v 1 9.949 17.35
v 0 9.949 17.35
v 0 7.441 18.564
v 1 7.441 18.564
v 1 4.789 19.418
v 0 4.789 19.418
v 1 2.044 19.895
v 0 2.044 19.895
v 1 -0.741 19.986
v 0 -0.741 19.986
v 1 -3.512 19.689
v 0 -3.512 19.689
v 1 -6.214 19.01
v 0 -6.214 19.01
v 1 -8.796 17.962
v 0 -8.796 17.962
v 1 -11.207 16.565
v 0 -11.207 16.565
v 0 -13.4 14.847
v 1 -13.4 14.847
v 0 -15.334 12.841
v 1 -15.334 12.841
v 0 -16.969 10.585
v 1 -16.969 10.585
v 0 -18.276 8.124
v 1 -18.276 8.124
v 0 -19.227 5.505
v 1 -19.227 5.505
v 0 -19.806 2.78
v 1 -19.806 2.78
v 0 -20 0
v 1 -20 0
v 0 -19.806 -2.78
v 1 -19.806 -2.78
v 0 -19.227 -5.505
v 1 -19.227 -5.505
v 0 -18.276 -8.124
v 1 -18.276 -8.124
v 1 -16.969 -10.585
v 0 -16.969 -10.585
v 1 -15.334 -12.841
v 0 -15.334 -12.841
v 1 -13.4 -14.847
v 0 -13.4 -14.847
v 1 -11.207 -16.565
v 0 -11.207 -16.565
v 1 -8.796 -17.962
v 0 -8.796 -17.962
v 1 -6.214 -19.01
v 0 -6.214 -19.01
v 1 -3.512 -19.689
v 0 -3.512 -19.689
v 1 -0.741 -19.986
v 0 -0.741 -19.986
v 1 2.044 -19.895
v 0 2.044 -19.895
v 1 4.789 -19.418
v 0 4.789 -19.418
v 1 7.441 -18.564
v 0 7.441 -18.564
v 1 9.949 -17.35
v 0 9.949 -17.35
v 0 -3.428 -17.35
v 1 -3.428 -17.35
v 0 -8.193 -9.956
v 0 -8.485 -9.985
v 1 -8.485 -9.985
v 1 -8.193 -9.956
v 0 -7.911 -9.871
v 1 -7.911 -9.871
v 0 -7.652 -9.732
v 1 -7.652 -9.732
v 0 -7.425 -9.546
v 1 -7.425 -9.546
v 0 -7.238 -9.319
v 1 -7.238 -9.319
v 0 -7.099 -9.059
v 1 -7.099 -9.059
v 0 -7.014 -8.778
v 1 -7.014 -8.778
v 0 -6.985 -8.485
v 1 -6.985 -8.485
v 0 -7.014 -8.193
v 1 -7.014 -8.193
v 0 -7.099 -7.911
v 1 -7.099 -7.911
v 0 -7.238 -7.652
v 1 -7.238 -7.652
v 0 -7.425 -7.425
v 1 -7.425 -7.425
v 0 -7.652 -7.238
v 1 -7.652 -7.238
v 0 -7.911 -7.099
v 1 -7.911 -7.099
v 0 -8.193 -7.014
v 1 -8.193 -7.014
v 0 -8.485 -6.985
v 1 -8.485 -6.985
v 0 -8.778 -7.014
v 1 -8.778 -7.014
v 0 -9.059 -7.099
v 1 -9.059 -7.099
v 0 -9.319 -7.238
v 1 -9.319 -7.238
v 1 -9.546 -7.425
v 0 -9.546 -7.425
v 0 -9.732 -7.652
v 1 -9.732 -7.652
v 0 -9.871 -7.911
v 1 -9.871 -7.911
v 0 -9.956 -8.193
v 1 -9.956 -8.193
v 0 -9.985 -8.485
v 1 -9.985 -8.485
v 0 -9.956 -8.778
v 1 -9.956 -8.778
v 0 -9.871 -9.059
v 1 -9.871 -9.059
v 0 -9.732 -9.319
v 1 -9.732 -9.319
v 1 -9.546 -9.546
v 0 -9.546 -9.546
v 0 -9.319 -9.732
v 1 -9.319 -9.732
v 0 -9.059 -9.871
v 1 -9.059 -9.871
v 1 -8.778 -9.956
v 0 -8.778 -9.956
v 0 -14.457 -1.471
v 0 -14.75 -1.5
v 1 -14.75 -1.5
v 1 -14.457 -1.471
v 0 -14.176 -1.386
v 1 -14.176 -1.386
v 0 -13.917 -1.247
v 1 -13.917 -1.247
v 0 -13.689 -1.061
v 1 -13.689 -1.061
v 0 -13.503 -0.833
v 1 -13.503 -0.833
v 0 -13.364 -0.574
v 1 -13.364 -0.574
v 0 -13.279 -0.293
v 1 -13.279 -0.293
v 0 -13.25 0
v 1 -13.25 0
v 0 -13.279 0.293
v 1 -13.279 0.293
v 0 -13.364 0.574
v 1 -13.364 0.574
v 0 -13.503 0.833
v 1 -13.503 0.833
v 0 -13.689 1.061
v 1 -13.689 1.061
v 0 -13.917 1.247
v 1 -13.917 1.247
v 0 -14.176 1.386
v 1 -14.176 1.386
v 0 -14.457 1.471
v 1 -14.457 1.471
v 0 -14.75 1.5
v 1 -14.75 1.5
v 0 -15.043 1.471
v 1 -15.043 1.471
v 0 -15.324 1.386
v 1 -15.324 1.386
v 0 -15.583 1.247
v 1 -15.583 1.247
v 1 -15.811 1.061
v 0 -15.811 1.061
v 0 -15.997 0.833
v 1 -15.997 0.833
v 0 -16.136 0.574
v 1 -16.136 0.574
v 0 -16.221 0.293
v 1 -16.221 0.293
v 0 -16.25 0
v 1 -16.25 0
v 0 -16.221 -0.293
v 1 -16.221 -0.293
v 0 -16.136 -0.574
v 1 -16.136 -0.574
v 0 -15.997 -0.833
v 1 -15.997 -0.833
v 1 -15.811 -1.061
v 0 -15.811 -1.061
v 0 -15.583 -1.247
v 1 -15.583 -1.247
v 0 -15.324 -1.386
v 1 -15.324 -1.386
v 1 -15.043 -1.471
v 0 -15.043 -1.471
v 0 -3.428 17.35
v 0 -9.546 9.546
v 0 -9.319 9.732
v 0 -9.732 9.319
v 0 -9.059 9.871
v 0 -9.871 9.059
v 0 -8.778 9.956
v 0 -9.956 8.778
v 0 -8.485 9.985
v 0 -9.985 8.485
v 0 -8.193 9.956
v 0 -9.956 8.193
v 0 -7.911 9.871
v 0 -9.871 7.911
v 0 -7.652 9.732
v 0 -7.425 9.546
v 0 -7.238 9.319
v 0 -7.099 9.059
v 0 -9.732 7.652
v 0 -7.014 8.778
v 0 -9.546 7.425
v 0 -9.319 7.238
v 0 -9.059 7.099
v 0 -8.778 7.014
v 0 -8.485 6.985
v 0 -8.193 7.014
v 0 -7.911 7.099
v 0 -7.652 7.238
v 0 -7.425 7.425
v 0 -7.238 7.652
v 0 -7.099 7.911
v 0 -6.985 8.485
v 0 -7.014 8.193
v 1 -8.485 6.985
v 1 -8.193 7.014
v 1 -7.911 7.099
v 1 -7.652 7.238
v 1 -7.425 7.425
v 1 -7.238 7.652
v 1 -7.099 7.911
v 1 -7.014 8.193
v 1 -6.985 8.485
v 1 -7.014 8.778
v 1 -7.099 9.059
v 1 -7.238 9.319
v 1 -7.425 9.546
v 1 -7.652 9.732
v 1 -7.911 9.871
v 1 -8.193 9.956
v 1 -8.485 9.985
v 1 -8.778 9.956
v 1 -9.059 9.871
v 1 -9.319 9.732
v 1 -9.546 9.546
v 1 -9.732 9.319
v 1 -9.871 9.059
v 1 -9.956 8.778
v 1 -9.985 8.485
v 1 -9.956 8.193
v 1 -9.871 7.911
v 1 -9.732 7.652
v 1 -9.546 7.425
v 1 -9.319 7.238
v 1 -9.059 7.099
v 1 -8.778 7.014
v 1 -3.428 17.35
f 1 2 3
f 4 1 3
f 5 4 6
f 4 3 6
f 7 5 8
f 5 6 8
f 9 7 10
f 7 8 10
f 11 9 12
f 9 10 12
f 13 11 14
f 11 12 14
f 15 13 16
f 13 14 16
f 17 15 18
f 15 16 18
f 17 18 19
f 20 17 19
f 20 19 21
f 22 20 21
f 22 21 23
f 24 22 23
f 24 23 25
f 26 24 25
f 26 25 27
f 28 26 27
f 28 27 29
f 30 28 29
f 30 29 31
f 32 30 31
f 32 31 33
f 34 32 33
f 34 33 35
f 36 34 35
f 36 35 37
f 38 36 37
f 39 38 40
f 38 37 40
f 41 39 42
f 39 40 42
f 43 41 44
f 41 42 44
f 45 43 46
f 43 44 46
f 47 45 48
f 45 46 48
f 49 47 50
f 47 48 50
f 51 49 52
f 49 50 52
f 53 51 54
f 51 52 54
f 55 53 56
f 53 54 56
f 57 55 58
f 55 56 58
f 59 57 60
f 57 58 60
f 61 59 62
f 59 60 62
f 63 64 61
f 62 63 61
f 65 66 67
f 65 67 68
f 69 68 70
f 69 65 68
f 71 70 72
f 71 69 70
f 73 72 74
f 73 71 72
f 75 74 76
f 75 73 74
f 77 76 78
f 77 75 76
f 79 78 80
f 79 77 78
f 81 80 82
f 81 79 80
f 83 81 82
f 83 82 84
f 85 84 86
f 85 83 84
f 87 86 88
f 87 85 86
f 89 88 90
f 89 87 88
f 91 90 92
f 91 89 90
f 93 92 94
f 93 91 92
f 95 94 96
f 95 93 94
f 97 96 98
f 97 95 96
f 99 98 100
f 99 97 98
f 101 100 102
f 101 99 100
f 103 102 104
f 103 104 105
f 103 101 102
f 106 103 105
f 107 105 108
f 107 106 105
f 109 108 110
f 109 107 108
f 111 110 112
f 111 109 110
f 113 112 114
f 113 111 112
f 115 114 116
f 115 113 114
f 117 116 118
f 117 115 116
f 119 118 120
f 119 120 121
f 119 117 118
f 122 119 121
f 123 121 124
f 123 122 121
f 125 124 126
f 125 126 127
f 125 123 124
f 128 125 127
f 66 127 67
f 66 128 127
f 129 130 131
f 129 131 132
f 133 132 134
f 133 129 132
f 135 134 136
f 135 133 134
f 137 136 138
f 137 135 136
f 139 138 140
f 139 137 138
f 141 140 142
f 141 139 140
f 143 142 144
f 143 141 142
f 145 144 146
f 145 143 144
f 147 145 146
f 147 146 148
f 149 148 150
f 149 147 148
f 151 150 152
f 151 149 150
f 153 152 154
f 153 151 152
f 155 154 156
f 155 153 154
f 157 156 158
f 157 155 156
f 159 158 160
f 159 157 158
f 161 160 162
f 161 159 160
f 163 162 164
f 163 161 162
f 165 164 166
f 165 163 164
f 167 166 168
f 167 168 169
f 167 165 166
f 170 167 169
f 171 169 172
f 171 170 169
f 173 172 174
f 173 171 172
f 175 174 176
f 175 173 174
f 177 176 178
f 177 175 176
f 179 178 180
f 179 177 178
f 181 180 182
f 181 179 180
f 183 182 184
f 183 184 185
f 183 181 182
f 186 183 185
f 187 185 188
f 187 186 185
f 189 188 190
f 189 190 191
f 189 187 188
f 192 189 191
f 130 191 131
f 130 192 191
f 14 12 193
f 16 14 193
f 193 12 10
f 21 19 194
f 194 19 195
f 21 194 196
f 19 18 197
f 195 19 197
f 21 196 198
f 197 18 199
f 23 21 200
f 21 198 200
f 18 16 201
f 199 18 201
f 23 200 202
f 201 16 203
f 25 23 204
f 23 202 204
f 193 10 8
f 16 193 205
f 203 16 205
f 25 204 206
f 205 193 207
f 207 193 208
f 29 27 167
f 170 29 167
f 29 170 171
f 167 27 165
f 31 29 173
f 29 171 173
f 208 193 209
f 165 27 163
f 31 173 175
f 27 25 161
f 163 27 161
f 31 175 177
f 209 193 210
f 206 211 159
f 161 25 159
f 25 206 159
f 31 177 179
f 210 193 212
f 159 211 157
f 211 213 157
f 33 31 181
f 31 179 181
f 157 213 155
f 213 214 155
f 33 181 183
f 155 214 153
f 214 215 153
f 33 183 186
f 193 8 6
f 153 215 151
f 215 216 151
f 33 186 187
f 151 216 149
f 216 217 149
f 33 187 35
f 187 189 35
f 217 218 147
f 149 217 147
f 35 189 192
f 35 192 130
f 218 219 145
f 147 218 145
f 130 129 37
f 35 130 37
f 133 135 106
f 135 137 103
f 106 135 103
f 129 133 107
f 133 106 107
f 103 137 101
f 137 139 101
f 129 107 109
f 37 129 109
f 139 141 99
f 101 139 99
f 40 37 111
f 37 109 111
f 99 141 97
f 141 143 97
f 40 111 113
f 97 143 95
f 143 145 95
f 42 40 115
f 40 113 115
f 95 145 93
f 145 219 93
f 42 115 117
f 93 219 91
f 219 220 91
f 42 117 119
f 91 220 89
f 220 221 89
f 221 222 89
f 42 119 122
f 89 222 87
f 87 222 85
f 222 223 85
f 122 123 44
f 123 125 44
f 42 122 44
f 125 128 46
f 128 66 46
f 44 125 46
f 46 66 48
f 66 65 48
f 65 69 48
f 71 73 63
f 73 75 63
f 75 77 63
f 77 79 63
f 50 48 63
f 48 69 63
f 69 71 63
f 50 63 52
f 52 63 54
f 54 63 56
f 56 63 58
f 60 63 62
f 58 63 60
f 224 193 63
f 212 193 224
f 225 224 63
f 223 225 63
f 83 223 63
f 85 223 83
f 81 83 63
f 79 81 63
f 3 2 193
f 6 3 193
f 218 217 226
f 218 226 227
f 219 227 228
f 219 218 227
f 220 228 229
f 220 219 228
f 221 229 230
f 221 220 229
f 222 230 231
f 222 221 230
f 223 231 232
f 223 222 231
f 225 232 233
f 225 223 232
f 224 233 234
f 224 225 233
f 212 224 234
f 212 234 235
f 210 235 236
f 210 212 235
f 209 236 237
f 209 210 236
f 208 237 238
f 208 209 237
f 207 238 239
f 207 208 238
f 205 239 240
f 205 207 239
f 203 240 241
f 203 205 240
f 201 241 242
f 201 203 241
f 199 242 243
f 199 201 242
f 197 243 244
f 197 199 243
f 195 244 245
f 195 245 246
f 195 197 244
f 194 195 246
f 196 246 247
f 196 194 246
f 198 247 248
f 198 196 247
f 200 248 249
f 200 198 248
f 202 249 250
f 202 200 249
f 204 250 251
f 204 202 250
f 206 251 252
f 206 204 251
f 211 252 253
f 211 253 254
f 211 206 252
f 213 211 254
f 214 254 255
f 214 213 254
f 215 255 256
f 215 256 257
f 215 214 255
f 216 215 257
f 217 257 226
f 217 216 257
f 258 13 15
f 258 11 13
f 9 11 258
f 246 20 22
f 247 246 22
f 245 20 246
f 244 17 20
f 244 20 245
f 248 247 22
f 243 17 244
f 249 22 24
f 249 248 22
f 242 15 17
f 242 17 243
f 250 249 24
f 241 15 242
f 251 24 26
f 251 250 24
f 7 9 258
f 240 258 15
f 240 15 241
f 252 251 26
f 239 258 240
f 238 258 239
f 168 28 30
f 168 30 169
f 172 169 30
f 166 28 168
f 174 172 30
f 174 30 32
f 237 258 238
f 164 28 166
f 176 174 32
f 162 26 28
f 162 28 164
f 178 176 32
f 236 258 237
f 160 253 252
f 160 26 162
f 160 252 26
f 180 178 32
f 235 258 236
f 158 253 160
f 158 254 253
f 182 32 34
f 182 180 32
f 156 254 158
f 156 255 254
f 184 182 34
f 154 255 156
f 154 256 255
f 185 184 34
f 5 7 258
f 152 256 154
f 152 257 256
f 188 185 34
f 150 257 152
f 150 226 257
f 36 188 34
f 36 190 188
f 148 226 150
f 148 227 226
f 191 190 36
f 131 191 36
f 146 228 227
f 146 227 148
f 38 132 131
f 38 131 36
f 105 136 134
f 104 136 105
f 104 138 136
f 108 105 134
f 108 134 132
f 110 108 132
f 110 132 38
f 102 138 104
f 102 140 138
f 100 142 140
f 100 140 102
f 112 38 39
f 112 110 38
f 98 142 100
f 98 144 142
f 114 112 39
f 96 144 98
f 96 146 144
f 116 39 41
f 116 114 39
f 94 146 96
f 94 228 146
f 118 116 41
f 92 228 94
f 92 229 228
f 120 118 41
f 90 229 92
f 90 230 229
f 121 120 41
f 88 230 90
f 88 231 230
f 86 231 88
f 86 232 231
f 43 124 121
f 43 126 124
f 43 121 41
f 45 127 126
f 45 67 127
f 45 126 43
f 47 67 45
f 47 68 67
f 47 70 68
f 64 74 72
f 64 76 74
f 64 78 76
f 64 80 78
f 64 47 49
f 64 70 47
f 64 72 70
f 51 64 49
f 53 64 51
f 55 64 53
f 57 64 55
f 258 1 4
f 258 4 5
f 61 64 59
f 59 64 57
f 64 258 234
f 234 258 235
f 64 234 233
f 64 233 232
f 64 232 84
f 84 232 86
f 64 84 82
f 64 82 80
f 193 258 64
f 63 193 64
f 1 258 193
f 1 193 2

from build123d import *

# Parameters (mm, degrees)
SKETCH1_R           = 20
SKETCH1_R_2         = 1.5
BOSS_EXTRUDE1_DEPTH = 1
SKETCH3_W           = 34.7
SKETCH3_H           = 20.778427125
CUT_EXTRUDE1_DEPTH  = 29.301943396


with BuildPart() as part:
    # Sketch1 → Boss-Extrude1 (new body)
    with BuildSketch(Plane(origin=(0, 0, 0), x_dir=(0, 0, -1), z_dir=(1, 0, 0))):
        Circle(SKETCH1_R)
        with Locations((0, 14.75)):
            Circle(SKETCH1_R_2, mode=Mode.SUBTRACT)
        with Locations((14.75, 0)):
            Circle(SKETCH1_R_2, mode=Mode.SUBTRACT)
        with Locations((0, -14.75)):
            Circle(SKETCH1_R_2, mode=Mode.SUBTRACT)
        with Locations((-14.75, 0)):
            Circle(SKETCH1_R_2, mode=Mode.SUBTRACT)
        with Locations((-8.485281374, 8.485281374)):
            Circle(SKETCH1_R_2, mode=Mode.SUBTRACT)
        with Locations((8.485281374, 8.485281374)):
            Circle(SKETCH1_R_2, mode=Mode.SUBTRACT)
        with Locations((8.485281374, -8.485281374)):
            Circle(SKETCH1_R_2, mode=Mode.SUBTRACT)
        with Locations((-8.485281374, -8.485281374)):
            Circle(SKETCH1_R_2, mode=Mode.SUBTRACT)
    extrude(amount=BOSS_EXTRUDE1_DEPTH)

    # Sketch3 → Cut-Extrude1 (cut, through all)
    with BuildSketch(Plane(origin=(1, 0, 0), x_dir=(0, 0, -1), z_dir=(1, 0, 0))):
        with Locations((0, 6.960786438)):
            Rectangle(SKETCH3_W, SKETCH3_H)
    extrude(amount=-CUT_EXTRUDE1_DEPTH, mode=Mode.SUBTRACT)


with BuildPart() as body_2:
    # of the pieces the cut leaves, the one that is kept (cut_extrude1_keep)
    add(part.part.solids().sort_by_distance((0, 9.948743639, 17.35))[0])


solid = body_2.part
